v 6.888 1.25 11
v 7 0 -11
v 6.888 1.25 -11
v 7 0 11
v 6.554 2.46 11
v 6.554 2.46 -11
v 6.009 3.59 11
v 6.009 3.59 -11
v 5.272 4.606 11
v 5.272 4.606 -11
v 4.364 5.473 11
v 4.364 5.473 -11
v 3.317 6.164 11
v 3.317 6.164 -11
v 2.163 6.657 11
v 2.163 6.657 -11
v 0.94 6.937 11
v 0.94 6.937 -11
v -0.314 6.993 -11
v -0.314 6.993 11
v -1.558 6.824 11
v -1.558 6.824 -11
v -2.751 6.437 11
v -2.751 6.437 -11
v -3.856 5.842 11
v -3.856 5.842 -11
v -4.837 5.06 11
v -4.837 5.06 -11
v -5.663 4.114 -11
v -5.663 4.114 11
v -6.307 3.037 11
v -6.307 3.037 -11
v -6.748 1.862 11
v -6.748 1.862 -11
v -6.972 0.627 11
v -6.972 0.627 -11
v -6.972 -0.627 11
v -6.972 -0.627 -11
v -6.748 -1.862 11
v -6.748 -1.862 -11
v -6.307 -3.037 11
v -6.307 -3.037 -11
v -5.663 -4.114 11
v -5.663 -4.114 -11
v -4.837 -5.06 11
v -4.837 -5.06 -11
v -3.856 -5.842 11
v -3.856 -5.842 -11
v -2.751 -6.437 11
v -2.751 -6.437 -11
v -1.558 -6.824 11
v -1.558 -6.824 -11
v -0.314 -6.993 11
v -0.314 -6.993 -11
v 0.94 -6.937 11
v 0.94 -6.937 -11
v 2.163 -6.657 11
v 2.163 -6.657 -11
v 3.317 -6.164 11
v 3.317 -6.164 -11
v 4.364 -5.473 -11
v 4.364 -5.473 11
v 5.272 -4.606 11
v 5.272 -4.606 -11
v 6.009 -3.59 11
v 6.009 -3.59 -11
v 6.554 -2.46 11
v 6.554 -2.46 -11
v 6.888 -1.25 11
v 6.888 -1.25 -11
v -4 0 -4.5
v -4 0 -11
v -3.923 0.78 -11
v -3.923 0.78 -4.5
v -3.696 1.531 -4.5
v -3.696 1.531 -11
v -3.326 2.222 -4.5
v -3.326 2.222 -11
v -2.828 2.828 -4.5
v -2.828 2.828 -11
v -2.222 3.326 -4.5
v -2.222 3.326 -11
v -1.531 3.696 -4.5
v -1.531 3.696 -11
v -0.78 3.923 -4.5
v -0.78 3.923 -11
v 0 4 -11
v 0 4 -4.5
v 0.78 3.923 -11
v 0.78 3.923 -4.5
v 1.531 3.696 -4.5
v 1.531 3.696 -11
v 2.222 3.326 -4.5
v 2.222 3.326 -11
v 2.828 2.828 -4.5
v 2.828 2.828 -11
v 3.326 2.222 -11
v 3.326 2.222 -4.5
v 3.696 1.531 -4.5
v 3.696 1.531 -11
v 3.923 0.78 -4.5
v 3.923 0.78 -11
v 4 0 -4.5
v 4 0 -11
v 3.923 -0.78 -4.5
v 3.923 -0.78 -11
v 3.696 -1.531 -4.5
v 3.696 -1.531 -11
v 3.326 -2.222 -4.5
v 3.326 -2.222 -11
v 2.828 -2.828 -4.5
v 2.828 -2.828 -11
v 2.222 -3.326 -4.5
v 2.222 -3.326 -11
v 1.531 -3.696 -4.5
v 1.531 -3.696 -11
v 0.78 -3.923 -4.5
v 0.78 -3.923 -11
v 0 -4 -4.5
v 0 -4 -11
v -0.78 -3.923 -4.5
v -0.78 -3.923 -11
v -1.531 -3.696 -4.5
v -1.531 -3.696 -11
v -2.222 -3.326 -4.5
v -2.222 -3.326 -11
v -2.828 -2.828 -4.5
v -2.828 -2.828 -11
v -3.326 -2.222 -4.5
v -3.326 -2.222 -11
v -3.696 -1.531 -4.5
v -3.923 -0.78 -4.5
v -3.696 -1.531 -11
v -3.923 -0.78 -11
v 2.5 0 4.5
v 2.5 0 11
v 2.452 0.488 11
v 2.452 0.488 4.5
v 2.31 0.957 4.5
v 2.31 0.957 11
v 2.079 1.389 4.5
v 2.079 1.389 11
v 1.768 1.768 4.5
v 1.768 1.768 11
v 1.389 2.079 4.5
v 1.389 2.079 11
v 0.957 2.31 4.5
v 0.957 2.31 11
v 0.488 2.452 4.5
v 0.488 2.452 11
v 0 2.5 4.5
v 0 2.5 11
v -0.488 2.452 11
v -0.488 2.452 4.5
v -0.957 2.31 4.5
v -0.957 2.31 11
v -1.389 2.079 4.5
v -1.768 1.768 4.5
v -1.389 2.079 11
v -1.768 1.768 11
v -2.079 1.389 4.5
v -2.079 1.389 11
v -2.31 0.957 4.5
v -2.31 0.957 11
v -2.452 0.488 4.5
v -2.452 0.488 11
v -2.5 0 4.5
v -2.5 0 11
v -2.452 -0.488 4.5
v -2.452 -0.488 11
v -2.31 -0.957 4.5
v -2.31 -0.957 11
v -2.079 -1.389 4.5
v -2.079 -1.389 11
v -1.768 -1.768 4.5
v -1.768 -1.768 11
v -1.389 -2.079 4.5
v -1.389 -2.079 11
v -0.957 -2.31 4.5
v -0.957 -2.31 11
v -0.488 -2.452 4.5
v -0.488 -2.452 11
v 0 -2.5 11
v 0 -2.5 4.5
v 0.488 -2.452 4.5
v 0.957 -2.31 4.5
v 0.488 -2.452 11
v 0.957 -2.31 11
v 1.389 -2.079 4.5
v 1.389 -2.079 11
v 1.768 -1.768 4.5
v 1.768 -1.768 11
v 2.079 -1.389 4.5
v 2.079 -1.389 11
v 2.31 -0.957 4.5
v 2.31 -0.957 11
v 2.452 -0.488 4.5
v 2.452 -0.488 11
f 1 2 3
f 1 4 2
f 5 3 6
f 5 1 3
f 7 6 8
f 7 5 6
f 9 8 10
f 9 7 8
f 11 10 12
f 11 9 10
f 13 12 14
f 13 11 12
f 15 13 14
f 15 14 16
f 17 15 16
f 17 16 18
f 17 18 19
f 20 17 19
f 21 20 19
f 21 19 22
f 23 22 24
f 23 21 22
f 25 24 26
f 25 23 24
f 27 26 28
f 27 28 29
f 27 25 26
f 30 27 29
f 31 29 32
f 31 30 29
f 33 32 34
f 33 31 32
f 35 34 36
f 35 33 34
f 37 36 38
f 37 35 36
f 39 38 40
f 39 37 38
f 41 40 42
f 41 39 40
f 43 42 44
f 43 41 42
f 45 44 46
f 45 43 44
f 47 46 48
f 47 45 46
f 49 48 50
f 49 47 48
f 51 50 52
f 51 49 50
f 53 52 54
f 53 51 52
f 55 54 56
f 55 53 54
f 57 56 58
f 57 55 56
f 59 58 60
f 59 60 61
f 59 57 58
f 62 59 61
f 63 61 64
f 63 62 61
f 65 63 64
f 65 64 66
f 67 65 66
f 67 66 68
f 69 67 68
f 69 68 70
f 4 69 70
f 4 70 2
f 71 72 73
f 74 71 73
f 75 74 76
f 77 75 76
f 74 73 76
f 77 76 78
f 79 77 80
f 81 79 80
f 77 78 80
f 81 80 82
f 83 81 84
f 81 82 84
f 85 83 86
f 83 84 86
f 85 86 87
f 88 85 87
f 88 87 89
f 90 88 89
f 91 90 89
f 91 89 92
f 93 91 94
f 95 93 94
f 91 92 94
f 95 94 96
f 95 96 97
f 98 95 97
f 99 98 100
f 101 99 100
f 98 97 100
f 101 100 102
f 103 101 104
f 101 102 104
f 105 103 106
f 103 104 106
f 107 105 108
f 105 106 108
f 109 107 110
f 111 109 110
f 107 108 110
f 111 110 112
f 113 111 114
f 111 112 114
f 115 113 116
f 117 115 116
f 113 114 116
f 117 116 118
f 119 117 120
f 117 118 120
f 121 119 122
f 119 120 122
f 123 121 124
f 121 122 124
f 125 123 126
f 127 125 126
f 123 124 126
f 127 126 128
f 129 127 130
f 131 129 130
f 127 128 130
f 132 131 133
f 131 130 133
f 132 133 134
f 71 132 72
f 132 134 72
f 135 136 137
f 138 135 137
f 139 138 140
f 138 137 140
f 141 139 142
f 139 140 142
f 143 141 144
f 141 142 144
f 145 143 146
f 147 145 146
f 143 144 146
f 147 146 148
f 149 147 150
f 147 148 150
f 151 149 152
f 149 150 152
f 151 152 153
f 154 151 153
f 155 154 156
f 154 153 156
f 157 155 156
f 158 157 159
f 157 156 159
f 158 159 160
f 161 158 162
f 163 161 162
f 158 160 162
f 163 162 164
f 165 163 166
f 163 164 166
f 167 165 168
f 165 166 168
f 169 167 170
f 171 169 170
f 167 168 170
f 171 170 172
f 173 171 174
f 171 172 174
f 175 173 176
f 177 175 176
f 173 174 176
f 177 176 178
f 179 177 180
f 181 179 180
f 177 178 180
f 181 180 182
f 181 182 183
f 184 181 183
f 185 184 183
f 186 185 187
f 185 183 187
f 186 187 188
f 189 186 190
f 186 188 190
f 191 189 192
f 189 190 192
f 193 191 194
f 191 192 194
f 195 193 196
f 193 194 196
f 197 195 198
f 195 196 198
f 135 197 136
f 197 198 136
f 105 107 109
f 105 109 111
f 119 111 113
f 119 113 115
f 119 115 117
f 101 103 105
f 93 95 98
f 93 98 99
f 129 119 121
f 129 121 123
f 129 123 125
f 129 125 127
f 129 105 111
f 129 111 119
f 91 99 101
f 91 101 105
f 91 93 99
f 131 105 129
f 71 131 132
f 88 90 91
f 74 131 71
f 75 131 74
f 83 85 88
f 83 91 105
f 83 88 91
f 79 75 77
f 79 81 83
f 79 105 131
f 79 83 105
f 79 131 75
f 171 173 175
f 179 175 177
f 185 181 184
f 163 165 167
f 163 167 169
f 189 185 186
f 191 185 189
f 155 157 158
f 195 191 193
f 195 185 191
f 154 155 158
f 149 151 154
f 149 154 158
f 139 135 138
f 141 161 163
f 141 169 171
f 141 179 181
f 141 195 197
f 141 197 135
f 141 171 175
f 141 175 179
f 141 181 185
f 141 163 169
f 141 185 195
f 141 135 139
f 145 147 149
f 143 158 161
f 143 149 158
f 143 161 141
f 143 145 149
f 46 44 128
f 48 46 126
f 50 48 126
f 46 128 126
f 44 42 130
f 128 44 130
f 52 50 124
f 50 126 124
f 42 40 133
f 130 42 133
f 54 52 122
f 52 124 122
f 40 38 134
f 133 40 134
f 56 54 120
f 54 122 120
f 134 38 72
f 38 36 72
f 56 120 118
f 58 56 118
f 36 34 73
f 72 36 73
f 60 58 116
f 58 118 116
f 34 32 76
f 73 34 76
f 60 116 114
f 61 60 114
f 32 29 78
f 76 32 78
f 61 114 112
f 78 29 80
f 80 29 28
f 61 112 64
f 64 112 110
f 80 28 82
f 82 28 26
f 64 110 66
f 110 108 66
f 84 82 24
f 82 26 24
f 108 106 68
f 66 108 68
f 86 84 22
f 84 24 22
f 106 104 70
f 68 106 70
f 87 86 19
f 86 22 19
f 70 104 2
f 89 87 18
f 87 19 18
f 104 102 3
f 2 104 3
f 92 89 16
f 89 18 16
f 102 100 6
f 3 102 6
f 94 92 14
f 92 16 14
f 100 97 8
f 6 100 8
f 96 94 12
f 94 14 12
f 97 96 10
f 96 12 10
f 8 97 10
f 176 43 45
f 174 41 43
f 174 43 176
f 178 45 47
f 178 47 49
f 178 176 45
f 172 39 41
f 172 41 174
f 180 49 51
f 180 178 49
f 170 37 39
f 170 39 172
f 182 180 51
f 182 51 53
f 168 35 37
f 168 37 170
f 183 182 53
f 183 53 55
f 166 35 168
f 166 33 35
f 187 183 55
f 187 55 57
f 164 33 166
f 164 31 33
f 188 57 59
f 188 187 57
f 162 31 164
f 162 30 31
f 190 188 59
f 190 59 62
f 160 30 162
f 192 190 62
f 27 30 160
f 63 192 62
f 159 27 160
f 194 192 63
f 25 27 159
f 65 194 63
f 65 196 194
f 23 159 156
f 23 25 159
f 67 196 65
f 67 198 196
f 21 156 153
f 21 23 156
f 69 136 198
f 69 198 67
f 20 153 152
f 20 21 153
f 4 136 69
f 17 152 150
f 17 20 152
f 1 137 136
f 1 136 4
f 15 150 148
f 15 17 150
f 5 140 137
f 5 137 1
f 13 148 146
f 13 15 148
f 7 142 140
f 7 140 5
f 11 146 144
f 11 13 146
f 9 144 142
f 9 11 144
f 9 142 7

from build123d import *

# Parameters (mm, degrees)
SKETCH1_R           = 7
BOSS_EXTRUDE1_DEPTH = 11
SKETCH2_R           = 2.5
CUT_EXTRUDE1_DEPTH  = 6.5
SKETCH3_R           = 4
CUT_EXTRUDE2_DEPTH  = 6.5


with BuildPart() as part:
    # Sketch1 → Boss-Extrude1 (new, symmetric)
    with BuildSketch(Plane.XY):
        Circle(SKETCH1_R)
    extrude(amount=BOSS_EXTRUDE1_DEPTH, both=True)

    # Sketch2 → Cut-Extrude1 (cut)
    with BuildSketch(Plane.XY.offset(11)):
        Circle(SKETCH2_R)
    extrude(amount=-CUT_EXTRUDE1_DEPTH, mode=Mode.SUBTRACT)

    # Sketch3 → Cut-Extrude2 (cut)
    with BuildSketch(Plane(origin=(0, 0, -11), x_dir=(-1, 0, 0), z_dir=(0, 0, -1))):
        Circle(SKETCH3_R)
    extrude(amount=-CUT_EXTRUDE2_DEPTH, mode=Mode.SUBTRACT)


solid = part.part
